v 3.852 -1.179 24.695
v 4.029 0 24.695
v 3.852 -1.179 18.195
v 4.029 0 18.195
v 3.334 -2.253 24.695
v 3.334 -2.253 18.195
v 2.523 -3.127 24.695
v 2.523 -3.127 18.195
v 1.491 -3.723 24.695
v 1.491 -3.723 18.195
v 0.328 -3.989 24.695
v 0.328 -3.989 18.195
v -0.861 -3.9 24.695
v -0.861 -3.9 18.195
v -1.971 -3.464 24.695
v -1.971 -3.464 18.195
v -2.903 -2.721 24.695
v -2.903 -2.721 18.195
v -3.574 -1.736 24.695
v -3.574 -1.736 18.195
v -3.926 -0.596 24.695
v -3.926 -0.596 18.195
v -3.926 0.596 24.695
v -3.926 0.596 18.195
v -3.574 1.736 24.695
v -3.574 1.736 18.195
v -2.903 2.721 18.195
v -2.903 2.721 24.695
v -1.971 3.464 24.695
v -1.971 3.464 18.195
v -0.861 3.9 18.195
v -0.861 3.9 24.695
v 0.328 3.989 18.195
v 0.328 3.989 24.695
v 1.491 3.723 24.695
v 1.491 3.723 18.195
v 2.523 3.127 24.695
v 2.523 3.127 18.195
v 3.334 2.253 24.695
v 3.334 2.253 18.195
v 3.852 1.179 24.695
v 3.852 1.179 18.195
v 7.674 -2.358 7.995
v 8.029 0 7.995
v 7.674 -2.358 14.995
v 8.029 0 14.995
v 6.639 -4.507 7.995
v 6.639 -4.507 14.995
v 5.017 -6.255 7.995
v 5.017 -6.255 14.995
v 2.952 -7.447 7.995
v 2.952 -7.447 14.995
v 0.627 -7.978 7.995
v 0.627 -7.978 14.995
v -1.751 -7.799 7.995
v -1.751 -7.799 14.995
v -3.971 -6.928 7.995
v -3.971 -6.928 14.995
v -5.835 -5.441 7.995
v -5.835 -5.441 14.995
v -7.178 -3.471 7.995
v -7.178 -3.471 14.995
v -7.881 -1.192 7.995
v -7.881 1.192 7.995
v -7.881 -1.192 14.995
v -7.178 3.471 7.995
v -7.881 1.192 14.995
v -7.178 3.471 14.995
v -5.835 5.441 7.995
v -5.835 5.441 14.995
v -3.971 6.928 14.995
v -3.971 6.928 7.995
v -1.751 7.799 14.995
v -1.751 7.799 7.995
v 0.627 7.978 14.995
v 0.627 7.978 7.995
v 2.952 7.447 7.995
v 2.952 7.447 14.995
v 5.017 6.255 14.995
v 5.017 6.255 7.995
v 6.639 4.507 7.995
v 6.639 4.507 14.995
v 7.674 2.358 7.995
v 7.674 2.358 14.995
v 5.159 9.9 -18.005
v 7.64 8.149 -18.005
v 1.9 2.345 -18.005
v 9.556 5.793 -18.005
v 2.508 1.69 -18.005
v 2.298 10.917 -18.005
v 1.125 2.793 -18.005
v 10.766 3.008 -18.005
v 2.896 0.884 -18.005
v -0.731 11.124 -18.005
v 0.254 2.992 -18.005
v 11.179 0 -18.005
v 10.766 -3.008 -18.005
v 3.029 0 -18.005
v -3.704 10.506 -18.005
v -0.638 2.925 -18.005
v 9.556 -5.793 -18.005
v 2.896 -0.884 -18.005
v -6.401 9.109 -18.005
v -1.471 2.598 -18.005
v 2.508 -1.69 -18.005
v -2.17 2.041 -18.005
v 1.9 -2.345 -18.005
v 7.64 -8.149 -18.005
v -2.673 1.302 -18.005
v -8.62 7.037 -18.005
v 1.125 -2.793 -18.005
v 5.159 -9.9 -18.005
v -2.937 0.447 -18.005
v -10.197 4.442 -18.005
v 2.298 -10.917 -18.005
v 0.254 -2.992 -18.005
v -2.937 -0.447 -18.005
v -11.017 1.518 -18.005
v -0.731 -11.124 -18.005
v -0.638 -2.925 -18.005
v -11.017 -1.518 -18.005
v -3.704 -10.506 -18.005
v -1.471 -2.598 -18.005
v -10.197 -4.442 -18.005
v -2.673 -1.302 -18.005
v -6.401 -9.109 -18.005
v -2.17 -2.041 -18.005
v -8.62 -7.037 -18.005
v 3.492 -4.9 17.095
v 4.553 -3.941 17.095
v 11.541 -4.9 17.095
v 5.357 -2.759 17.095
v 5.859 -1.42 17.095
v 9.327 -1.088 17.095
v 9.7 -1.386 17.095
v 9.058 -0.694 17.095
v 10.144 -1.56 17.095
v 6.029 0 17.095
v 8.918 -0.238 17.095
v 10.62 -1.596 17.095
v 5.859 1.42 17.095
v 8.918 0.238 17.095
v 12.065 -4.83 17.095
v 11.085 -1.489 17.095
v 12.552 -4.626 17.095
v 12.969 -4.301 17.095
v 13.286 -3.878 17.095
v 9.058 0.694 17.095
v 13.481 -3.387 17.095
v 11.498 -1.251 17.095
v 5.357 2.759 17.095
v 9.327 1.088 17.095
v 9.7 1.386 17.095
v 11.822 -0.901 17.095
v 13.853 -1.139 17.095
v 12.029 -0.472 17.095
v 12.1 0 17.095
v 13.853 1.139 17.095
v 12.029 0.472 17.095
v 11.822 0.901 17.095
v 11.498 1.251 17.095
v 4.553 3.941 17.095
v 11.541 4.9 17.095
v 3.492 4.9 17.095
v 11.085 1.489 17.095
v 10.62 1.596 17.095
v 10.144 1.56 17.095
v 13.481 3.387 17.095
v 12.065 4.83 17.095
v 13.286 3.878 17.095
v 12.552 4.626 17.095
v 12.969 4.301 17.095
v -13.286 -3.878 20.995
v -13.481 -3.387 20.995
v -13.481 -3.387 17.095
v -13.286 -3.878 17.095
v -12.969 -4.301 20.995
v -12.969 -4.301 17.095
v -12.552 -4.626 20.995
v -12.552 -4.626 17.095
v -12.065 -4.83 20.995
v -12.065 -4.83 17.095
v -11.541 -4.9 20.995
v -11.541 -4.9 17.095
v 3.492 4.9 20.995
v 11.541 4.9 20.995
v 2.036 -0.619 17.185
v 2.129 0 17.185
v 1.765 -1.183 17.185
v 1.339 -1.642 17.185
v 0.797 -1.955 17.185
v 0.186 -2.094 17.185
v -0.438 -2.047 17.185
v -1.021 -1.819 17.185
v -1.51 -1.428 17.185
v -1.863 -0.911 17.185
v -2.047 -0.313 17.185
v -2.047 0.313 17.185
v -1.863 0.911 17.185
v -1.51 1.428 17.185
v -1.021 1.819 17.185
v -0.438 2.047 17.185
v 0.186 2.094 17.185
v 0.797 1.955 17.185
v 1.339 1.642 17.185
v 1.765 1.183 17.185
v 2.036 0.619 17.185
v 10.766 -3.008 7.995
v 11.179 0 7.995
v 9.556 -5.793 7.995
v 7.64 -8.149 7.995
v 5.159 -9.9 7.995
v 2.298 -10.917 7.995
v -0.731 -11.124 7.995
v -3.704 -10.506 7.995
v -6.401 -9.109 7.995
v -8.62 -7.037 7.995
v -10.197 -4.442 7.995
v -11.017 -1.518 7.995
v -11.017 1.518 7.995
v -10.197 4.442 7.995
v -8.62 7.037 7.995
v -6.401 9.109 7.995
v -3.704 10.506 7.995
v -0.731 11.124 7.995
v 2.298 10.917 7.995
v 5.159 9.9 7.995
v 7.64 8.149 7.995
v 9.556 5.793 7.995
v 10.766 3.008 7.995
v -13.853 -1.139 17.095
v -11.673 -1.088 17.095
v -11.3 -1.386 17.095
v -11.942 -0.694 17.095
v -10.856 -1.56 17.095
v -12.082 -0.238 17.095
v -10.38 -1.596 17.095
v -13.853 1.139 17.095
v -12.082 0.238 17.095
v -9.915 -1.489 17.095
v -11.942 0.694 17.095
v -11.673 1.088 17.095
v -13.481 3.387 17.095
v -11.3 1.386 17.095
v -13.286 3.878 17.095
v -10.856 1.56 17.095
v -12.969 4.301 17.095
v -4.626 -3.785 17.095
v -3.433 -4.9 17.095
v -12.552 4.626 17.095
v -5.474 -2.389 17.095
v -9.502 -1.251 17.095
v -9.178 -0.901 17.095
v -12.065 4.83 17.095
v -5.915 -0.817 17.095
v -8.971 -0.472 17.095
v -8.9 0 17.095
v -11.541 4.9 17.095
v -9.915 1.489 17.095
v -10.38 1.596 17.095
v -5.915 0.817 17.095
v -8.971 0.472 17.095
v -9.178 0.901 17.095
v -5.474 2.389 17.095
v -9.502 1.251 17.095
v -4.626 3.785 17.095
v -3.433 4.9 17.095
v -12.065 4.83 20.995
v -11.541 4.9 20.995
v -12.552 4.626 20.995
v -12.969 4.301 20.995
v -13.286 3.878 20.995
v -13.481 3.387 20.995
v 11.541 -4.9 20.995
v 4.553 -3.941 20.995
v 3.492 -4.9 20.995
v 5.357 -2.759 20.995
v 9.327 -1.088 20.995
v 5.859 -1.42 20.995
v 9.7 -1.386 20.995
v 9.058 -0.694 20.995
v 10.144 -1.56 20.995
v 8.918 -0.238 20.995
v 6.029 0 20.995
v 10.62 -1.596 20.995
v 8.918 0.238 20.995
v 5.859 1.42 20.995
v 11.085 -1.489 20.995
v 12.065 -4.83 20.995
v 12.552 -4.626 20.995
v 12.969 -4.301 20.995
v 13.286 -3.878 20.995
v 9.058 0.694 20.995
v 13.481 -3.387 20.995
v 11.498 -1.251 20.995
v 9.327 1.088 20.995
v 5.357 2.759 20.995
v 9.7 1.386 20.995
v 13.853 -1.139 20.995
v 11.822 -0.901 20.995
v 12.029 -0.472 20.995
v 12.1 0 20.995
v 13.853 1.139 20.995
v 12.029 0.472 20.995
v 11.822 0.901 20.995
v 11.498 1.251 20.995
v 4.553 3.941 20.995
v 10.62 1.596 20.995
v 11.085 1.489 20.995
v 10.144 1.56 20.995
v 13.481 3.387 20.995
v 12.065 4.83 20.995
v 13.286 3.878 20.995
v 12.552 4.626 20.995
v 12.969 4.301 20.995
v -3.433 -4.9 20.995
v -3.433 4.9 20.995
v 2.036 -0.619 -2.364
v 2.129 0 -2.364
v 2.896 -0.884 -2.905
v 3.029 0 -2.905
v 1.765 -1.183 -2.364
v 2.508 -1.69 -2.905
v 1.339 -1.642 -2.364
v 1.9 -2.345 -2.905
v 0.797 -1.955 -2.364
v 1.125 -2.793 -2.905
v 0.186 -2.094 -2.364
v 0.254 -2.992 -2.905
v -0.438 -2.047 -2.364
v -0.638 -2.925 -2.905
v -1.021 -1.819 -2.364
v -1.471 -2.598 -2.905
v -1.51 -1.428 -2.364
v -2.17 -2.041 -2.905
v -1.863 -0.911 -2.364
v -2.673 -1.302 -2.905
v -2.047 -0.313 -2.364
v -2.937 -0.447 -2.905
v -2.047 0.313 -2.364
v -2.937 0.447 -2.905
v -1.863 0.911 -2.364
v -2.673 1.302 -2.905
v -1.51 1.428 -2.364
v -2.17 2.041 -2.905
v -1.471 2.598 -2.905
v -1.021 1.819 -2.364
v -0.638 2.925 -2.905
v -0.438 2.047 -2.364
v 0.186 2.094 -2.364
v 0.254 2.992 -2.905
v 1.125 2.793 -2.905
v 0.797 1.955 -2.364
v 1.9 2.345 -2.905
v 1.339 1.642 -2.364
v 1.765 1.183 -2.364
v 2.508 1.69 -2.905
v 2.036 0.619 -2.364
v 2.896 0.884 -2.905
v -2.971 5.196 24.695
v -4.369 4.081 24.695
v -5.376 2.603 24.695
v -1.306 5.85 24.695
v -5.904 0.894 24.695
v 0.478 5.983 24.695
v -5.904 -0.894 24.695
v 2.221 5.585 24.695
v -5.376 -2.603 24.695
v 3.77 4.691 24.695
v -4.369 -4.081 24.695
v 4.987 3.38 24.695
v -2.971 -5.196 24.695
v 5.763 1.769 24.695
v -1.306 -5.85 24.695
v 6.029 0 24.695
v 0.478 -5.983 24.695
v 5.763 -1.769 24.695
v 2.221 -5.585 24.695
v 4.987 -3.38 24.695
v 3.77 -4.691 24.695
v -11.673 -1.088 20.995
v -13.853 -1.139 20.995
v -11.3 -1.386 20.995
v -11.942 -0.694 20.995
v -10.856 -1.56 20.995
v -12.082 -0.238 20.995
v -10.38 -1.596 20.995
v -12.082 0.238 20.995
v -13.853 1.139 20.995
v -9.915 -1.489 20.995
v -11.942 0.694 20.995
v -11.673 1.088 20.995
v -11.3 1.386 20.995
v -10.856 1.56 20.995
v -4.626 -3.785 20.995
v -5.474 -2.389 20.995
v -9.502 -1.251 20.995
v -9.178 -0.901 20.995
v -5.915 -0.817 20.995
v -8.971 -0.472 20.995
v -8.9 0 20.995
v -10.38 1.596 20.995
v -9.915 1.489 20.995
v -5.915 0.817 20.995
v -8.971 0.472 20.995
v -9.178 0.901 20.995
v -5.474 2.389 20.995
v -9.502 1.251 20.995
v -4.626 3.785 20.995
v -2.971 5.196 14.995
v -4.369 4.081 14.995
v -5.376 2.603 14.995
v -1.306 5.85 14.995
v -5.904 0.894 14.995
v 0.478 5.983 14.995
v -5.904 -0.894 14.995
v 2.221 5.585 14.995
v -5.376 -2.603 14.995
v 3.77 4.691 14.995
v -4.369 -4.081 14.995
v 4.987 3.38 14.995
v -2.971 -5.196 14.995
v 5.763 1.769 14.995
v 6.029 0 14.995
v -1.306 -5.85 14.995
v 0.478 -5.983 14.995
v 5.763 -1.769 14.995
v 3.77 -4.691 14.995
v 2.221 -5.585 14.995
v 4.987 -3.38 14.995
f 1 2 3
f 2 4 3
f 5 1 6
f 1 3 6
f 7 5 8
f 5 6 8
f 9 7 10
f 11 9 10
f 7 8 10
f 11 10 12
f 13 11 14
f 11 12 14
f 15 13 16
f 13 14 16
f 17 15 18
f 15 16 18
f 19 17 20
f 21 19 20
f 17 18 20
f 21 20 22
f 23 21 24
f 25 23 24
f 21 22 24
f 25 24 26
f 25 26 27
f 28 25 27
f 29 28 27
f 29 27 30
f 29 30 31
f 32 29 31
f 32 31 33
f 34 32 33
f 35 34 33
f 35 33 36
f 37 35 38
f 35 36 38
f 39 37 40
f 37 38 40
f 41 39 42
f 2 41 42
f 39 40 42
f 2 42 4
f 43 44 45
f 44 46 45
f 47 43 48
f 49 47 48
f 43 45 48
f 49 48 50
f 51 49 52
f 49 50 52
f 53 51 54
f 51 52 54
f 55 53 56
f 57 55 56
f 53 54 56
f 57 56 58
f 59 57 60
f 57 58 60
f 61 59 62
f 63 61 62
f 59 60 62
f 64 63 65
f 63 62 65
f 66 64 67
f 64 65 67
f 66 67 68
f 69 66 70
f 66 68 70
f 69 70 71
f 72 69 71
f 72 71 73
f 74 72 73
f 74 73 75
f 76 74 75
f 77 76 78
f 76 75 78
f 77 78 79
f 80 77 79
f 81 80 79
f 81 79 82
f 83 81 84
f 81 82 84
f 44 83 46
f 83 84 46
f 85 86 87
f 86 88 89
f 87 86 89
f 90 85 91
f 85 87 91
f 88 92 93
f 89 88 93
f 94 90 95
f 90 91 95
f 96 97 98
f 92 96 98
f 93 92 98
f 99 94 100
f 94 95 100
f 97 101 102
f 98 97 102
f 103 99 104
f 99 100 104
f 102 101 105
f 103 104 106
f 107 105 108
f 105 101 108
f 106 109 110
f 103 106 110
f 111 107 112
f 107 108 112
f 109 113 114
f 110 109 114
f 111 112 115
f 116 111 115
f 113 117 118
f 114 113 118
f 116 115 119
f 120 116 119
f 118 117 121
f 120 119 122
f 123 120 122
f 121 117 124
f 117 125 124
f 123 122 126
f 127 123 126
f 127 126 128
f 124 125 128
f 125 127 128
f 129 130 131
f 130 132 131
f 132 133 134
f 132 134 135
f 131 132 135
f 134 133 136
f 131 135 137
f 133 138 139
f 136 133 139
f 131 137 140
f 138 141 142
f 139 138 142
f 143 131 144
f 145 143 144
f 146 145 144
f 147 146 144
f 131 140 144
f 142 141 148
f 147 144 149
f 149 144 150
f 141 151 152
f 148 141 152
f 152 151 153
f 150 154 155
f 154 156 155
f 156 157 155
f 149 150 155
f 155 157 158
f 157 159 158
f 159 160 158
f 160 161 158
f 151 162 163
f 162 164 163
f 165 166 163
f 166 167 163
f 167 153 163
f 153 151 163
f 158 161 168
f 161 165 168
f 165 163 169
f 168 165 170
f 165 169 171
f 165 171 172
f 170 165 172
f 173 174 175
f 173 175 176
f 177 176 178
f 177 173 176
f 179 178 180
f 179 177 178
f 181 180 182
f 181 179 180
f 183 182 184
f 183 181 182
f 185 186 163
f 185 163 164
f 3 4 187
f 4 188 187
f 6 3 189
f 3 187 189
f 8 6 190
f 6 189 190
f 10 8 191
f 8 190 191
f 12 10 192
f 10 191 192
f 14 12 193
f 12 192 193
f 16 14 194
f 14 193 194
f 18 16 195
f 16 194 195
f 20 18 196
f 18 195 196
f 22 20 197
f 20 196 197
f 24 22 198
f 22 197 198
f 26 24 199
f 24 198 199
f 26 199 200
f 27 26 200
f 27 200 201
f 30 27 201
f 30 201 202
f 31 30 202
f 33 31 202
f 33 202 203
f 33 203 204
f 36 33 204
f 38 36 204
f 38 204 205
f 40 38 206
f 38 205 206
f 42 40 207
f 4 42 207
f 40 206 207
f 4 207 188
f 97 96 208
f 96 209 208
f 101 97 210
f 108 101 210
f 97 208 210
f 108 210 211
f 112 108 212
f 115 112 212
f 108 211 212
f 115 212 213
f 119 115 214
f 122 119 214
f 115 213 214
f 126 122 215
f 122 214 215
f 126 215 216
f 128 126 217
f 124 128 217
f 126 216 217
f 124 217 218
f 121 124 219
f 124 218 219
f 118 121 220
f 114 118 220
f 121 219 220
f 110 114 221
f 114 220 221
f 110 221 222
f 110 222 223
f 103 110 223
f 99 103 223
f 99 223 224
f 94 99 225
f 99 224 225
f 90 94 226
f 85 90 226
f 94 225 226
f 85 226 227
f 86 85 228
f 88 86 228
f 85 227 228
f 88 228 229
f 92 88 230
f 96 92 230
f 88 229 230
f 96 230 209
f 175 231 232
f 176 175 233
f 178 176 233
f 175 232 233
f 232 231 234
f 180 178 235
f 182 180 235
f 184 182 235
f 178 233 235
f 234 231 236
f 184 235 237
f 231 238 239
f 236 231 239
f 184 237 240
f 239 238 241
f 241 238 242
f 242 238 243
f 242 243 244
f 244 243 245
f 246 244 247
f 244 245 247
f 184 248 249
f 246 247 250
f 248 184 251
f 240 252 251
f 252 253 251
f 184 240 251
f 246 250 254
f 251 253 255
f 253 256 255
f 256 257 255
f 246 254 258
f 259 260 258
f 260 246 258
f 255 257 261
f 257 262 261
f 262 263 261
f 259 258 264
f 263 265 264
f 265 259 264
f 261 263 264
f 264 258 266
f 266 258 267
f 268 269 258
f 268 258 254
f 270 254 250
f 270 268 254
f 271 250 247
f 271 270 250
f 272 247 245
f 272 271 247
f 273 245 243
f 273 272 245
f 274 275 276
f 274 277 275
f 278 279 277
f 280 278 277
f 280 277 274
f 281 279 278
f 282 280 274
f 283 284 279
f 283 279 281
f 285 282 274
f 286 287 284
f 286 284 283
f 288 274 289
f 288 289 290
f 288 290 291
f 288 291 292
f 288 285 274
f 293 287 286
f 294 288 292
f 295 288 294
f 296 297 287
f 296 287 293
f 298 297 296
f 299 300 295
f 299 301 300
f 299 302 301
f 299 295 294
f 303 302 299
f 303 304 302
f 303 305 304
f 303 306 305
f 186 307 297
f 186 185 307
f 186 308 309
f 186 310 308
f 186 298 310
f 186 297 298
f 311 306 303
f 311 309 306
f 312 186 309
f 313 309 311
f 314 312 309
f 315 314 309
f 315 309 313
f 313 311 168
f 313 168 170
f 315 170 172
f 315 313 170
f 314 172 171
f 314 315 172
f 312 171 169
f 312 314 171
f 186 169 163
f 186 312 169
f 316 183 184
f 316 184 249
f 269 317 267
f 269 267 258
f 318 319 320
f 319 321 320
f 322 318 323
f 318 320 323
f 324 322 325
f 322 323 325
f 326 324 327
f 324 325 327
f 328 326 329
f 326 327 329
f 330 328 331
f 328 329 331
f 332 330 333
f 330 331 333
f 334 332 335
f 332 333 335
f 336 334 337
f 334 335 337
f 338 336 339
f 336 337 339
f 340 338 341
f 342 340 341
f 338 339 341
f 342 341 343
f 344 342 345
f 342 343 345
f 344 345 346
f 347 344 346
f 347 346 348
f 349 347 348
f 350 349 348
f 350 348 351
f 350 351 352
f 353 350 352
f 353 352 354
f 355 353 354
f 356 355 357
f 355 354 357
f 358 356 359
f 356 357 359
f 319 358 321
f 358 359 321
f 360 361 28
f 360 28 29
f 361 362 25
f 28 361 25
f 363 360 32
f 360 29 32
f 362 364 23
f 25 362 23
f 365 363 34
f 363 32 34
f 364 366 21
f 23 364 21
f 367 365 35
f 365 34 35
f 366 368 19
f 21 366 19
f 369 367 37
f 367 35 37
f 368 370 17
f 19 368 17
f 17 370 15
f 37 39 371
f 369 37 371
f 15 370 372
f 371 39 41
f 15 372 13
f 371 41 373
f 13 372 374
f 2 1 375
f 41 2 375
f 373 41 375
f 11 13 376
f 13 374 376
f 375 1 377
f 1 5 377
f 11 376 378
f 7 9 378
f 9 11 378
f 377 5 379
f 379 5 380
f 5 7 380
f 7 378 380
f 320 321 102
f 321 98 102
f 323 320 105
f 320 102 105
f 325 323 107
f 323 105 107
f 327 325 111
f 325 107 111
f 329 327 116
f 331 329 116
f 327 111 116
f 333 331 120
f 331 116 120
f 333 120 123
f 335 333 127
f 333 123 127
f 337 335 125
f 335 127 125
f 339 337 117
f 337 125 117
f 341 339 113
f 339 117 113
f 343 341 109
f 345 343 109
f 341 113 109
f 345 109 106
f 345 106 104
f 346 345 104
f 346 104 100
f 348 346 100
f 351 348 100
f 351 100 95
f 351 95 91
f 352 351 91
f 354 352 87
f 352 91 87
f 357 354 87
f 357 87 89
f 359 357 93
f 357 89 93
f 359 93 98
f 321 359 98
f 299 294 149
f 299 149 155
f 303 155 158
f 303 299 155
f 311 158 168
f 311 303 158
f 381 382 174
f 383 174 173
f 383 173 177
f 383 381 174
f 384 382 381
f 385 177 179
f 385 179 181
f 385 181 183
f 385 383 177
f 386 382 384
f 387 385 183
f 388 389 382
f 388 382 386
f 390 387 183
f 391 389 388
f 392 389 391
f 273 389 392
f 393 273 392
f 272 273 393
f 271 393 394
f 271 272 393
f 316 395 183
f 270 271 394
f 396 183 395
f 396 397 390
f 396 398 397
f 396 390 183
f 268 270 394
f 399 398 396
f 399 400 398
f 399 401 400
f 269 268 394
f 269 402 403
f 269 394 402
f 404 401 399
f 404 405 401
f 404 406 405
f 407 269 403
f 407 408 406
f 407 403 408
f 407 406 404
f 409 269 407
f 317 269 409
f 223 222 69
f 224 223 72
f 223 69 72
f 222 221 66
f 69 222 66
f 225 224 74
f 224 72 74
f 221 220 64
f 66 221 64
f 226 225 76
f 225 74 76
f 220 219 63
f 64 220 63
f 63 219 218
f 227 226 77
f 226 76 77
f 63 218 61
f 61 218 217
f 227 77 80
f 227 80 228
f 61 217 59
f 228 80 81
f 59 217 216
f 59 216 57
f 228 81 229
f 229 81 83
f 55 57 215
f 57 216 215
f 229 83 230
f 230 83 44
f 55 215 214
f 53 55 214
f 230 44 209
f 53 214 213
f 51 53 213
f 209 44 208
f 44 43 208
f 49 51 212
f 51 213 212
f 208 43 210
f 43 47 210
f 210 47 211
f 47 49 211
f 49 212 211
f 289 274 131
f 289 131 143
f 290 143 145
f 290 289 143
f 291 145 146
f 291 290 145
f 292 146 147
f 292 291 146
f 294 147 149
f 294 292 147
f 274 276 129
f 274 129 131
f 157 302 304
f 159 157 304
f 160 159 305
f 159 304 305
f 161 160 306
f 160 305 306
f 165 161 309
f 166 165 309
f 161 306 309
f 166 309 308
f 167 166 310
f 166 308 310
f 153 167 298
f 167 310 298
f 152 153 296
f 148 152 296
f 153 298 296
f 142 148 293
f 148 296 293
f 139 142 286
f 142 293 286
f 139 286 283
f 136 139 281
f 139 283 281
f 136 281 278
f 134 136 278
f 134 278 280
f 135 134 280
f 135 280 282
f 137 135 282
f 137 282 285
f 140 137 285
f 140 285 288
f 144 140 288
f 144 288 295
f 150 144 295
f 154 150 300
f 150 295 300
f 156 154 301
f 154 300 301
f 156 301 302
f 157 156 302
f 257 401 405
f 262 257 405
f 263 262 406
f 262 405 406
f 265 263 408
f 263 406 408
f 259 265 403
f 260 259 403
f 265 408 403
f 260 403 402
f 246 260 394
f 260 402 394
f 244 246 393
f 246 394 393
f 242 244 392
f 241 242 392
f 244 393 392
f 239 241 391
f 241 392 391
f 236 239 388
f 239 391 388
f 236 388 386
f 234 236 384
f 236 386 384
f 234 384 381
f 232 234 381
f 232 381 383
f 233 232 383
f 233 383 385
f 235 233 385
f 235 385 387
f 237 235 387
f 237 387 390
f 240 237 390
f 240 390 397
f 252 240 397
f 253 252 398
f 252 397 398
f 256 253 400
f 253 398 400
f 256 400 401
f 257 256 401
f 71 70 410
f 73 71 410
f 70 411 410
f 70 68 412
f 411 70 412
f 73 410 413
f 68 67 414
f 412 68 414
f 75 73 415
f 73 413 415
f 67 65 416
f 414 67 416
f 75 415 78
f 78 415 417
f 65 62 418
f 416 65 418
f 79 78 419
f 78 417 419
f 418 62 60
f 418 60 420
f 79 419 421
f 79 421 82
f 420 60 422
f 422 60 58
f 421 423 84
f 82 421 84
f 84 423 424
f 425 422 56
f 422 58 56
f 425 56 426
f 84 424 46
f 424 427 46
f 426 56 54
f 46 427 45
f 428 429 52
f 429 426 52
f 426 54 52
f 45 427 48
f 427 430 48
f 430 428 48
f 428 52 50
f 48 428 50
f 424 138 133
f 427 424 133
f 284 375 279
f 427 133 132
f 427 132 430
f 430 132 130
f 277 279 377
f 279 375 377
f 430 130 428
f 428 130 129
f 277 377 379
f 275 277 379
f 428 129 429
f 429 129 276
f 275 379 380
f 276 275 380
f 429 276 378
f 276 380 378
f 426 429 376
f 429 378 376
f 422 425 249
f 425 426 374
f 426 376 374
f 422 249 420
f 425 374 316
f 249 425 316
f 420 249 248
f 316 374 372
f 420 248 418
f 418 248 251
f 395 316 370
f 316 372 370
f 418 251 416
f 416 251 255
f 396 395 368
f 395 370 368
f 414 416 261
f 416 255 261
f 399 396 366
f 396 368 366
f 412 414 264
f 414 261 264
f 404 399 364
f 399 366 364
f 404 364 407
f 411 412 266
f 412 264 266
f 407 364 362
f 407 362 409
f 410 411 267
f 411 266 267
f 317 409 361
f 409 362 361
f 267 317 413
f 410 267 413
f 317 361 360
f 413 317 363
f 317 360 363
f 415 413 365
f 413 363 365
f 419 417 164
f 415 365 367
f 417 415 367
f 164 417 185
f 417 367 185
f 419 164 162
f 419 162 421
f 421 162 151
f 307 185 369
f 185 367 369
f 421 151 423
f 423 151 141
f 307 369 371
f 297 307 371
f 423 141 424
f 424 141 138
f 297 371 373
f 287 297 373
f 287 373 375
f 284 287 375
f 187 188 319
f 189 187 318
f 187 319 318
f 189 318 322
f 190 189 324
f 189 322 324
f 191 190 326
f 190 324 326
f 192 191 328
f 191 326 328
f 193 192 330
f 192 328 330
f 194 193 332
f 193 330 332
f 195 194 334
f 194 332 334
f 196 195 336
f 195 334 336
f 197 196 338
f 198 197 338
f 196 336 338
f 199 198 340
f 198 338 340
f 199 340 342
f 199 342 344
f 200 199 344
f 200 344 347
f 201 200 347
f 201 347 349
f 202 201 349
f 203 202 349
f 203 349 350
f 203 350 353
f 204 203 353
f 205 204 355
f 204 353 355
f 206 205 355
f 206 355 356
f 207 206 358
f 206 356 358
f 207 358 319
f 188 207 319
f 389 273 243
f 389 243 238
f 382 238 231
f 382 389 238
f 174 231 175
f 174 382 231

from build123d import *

# Parameters (mm, degrees)
F3_R     = 4
F4_DEPTH = 3.9
F5_R     = 1.6
F6_DEPTH = 3.9


with BuildPart() as f1:
    # F0 (on Front) → F1 (revolve)
    with BuildSketch(Plane.XZ):
        Polygon((3.0294142647, -2.9052242924), (3.0294142647, -18.0052242924), (11.1794142647, -18.0052242924), (11.1794142647, 7.9947757076), (8.0294142647, 7.9947757076), (8.0294142647, 14.9947757076), (6.0294142647, 14.9947757076), (6.0294142647, 20.9947757076), (6.0294142647, 24.6947757076), (4.0294142647, 24.6947757076), (4.0294142647, 18.1947757076), (2.1294142647, 17.1845277874), (2.1294142647, -2.3644497353), align=None)
    revolve(axis=Axis((0.0294142647, 0, 3.3447757076), (0, 0, -1)))

    # F3 (on offset) → F4 (join)
    with BuildSketch(Plane.XY.offset(20.9947757076)):
        with BuildLine():
            ThreePointArc((-11.541230437, 4.9), (-12.7711105295, 4.4771477286), (-13.4809330315, 3.387394958))
            ThreePointArc((-13.4809330315, 3.387394958), (-13.9, 0), (-13.4809330315, -3.387394958))
            ThreePointArc((-13.4809330315, -3.387394958), (-12.7711105295, -4.4771477286), (-11.541230437, -4.9))
            Line((-11.541230437, -4.9), (11.541230437, -4.9))
            ThreePointArc((11.541230437, -4.9), (12.7711105295, -4.4771477286), (13.4809330315, -3.387394958))
            ThreePointArc((13.4809330315, -3.387394958), (13.9, 0), (13.4809330315, 3.387394958))
            ThreePointArc((13.4809330315, 3.387394958), (12.7711105295, 4.4771477286), (11.541230437, 4.9))
            Line((11.541230437, 4.9), (-11.541230437, 4.9))
        make_face()
        with Locations((0.0294142647, 0)):
            Circle(F3_R, mode=Mode.SUBTRACT)
    extrude(amount=-F4_DEPTH)

    # F5 (on face) → F6 (cut, through all)
    with BuildSketch(Plane.XY.offset(20.9947757076)):
        with Locations((-10.5, 0)):
            Circle(F5_R)
        with Locations((10.5, 0)):
            Circle(F5_R)
    extrude(amount=-F6_DEPTH, mode=Mode.SUBTRACT)


solid = f1.part
